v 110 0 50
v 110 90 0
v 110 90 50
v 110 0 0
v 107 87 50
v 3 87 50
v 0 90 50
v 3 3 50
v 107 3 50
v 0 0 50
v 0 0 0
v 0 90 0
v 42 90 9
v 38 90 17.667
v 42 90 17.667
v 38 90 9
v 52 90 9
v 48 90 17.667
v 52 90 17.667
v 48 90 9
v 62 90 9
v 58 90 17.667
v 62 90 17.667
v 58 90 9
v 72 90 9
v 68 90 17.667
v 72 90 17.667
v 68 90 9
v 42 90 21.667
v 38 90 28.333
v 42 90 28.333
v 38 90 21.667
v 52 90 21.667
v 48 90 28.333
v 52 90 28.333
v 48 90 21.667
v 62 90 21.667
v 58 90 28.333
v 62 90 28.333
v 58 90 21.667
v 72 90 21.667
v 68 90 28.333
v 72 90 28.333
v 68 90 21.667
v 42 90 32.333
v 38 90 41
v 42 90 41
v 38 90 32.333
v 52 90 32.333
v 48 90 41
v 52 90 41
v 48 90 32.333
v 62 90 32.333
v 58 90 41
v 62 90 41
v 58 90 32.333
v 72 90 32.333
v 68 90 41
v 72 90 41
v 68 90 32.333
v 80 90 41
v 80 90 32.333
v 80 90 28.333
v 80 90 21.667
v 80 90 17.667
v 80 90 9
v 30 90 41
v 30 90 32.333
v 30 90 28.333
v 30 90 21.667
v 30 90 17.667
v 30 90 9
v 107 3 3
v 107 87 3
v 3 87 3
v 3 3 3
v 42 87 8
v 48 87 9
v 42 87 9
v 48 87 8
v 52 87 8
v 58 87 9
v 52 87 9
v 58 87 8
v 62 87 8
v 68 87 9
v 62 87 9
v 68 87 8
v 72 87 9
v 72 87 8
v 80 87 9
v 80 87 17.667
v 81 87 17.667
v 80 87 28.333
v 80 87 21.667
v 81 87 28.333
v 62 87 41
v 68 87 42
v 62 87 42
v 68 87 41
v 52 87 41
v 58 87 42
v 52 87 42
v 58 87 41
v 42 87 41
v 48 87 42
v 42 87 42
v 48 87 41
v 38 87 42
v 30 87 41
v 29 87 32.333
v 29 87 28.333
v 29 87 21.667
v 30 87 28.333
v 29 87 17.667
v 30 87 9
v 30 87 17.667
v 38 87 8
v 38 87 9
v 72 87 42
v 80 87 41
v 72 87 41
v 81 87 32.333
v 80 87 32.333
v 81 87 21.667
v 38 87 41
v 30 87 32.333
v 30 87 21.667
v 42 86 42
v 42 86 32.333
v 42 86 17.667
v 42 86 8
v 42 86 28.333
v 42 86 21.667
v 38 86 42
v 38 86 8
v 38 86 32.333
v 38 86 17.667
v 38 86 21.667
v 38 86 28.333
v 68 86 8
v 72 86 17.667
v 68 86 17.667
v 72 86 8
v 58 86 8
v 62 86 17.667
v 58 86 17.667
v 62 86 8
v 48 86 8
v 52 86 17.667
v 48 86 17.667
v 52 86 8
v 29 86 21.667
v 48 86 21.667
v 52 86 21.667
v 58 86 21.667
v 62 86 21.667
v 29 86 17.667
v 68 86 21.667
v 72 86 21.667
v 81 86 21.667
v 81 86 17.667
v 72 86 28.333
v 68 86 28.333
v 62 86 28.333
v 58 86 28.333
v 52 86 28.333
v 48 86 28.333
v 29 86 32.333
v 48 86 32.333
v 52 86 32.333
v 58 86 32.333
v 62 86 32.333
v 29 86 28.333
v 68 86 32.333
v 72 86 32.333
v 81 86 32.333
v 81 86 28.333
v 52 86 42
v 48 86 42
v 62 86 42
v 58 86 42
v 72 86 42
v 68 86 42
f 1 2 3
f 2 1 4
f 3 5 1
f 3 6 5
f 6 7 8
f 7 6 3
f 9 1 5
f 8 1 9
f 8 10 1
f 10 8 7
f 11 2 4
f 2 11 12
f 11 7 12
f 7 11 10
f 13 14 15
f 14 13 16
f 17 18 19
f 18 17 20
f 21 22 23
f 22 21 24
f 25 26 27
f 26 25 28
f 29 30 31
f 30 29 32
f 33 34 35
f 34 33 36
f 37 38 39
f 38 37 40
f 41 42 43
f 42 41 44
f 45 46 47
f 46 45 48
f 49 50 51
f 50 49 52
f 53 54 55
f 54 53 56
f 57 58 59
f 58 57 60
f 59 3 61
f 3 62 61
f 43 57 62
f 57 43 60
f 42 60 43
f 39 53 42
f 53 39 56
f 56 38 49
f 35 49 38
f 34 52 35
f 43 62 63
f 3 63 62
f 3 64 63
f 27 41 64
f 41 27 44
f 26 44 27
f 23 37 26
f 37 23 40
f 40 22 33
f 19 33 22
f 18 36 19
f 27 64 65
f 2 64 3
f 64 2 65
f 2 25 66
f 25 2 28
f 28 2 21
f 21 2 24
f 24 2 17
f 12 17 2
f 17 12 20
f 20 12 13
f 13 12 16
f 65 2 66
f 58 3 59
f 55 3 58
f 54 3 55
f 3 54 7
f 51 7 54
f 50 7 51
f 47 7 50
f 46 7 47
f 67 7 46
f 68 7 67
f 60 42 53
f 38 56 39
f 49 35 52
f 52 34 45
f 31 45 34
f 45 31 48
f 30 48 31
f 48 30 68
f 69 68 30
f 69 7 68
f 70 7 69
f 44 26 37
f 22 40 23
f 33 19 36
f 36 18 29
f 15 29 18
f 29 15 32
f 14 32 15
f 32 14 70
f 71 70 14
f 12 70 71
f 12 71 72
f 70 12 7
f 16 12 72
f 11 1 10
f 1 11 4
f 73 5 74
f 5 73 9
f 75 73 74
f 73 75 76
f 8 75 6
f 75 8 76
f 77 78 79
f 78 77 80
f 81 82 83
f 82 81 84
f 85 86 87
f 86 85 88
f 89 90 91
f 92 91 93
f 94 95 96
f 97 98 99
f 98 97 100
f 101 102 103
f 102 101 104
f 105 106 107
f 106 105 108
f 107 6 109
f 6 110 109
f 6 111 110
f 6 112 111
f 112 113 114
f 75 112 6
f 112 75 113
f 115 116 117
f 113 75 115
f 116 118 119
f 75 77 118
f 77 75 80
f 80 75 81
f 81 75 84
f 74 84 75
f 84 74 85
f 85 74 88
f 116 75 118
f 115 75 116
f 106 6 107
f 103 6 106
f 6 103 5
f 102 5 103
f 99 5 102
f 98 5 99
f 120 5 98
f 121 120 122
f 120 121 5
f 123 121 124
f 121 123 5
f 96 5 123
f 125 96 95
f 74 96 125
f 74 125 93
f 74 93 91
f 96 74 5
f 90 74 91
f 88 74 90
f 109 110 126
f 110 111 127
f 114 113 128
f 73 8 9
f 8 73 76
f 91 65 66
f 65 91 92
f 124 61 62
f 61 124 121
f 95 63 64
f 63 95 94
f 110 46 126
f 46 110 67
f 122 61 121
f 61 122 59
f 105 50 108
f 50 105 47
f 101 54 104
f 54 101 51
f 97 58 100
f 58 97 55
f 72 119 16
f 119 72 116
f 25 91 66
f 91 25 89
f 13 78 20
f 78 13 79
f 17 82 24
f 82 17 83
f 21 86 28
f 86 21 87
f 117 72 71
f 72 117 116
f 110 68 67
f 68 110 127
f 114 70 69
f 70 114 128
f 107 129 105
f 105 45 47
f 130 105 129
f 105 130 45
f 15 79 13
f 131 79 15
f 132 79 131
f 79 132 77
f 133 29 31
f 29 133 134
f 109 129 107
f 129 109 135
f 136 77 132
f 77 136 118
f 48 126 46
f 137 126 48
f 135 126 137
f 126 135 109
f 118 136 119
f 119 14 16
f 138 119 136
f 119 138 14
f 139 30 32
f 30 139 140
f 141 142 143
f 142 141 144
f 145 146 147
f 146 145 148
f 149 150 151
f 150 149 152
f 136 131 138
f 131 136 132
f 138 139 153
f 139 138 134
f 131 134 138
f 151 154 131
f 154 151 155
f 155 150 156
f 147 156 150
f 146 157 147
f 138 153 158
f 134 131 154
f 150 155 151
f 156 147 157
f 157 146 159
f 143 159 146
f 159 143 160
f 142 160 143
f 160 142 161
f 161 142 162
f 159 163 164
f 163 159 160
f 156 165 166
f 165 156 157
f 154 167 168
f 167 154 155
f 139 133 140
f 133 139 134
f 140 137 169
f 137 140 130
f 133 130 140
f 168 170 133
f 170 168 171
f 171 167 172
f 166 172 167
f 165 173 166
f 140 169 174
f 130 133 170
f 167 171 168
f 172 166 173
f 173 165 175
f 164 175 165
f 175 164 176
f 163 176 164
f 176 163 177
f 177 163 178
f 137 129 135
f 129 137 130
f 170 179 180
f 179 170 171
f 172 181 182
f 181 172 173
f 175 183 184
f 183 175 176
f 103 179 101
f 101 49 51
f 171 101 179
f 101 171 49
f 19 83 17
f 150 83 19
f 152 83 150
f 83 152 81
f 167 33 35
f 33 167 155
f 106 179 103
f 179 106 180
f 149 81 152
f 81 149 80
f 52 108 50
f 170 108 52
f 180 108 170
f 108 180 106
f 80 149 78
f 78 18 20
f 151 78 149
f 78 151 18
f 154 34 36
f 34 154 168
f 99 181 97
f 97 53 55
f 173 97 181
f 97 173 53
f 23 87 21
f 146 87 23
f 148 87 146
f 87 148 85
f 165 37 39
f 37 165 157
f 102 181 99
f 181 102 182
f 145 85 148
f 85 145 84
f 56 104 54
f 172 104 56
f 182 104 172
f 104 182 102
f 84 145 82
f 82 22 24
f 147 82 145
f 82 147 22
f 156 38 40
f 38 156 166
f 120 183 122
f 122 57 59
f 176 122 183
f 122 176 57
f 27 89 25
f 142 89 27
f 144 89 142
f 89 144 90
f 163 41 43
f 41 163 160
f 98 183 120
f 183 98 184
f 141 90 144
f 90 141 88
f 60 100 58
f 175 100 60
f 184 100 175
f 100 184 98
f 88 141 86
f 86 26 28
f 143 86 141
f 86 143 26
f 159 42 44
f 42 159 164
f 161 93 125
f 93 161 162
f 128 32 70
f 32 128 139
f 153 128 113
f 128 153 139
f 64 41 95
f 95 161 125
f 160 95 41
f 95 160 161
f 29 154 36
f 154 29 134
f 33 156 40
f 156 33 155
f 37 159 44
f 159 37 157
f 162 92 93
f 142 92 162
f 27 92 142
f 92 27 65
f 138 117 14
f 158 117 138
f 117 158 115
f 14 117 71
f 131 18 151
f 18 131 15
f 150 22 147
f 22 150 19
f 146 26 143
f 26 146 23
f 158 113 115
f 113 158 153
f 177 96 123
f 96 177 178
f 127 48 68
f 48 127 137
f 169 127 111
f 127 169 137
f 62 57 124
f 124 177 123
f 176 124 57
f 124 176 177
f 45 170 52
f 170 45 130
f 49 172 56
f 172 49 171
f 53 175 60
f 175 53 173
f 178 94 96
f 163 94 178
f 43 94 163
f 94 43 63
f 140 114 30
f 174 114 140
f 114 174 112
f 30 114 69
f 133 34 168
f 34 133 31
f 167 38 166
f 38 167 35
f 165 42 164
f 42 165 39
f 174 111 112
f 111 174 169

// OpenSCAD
$fn = 32;

// ----------------------------------------------------------------------
// Vent box: crossgrid enclosure
// ----------------------------------------------------------------------

// --- parameters (mm) ---
box_l = 110;              // box length, X
box_w = 90;               // box width, Y
box_h = 50;               // box height, Z
wall_t = 3;               // shell wall thickness
win_l = 50;               // vent window width, X
win_h = 32;               // vent window height, Z
bar_w = 4;                // grid bar width
n_v = 4;                  // vertical bar count
n_h = 2;                  // horizontal bar count

win_z0 = (box_h - win_h) / 2;  // window lower edge Z
v_step = win_l / (n_v + 1);  // vertical bar step
h_step = win_h / (n_h + 1);  // horizontal bar step

difference() {
  union() {
    difference() {
      cube([box_l, box_w, box_h]);
  translate([wall_t, wall_t, wall_t])
    cube([box_l - 2 * wall_t, box_w - 2 * wall_t, box_h]);
  translate([(box_l - win_l) / 2, box_w - wall_t - 1, win_z0])
    cube([win_l, wall_t + 2, win_h]);
    }
    for (i = [1 : n_v])
      translate([(box_l - win_l) / 2 + i * v_step - bar_w / 2,
                 box_w - wall_t - 1, win_z0 - 1])
        cube([bar_w, wall_t + 1, win_h + 2]);
    for (i = [1 : n_h])
      translate([(box_l - win_l) / 2 - 1, box_w - wall_t - 1,
                 win_z0 + i * h_step - bar_w / 2])
        cube([win_l + 2, wall_t + 1, bar_w]);
  }
}
